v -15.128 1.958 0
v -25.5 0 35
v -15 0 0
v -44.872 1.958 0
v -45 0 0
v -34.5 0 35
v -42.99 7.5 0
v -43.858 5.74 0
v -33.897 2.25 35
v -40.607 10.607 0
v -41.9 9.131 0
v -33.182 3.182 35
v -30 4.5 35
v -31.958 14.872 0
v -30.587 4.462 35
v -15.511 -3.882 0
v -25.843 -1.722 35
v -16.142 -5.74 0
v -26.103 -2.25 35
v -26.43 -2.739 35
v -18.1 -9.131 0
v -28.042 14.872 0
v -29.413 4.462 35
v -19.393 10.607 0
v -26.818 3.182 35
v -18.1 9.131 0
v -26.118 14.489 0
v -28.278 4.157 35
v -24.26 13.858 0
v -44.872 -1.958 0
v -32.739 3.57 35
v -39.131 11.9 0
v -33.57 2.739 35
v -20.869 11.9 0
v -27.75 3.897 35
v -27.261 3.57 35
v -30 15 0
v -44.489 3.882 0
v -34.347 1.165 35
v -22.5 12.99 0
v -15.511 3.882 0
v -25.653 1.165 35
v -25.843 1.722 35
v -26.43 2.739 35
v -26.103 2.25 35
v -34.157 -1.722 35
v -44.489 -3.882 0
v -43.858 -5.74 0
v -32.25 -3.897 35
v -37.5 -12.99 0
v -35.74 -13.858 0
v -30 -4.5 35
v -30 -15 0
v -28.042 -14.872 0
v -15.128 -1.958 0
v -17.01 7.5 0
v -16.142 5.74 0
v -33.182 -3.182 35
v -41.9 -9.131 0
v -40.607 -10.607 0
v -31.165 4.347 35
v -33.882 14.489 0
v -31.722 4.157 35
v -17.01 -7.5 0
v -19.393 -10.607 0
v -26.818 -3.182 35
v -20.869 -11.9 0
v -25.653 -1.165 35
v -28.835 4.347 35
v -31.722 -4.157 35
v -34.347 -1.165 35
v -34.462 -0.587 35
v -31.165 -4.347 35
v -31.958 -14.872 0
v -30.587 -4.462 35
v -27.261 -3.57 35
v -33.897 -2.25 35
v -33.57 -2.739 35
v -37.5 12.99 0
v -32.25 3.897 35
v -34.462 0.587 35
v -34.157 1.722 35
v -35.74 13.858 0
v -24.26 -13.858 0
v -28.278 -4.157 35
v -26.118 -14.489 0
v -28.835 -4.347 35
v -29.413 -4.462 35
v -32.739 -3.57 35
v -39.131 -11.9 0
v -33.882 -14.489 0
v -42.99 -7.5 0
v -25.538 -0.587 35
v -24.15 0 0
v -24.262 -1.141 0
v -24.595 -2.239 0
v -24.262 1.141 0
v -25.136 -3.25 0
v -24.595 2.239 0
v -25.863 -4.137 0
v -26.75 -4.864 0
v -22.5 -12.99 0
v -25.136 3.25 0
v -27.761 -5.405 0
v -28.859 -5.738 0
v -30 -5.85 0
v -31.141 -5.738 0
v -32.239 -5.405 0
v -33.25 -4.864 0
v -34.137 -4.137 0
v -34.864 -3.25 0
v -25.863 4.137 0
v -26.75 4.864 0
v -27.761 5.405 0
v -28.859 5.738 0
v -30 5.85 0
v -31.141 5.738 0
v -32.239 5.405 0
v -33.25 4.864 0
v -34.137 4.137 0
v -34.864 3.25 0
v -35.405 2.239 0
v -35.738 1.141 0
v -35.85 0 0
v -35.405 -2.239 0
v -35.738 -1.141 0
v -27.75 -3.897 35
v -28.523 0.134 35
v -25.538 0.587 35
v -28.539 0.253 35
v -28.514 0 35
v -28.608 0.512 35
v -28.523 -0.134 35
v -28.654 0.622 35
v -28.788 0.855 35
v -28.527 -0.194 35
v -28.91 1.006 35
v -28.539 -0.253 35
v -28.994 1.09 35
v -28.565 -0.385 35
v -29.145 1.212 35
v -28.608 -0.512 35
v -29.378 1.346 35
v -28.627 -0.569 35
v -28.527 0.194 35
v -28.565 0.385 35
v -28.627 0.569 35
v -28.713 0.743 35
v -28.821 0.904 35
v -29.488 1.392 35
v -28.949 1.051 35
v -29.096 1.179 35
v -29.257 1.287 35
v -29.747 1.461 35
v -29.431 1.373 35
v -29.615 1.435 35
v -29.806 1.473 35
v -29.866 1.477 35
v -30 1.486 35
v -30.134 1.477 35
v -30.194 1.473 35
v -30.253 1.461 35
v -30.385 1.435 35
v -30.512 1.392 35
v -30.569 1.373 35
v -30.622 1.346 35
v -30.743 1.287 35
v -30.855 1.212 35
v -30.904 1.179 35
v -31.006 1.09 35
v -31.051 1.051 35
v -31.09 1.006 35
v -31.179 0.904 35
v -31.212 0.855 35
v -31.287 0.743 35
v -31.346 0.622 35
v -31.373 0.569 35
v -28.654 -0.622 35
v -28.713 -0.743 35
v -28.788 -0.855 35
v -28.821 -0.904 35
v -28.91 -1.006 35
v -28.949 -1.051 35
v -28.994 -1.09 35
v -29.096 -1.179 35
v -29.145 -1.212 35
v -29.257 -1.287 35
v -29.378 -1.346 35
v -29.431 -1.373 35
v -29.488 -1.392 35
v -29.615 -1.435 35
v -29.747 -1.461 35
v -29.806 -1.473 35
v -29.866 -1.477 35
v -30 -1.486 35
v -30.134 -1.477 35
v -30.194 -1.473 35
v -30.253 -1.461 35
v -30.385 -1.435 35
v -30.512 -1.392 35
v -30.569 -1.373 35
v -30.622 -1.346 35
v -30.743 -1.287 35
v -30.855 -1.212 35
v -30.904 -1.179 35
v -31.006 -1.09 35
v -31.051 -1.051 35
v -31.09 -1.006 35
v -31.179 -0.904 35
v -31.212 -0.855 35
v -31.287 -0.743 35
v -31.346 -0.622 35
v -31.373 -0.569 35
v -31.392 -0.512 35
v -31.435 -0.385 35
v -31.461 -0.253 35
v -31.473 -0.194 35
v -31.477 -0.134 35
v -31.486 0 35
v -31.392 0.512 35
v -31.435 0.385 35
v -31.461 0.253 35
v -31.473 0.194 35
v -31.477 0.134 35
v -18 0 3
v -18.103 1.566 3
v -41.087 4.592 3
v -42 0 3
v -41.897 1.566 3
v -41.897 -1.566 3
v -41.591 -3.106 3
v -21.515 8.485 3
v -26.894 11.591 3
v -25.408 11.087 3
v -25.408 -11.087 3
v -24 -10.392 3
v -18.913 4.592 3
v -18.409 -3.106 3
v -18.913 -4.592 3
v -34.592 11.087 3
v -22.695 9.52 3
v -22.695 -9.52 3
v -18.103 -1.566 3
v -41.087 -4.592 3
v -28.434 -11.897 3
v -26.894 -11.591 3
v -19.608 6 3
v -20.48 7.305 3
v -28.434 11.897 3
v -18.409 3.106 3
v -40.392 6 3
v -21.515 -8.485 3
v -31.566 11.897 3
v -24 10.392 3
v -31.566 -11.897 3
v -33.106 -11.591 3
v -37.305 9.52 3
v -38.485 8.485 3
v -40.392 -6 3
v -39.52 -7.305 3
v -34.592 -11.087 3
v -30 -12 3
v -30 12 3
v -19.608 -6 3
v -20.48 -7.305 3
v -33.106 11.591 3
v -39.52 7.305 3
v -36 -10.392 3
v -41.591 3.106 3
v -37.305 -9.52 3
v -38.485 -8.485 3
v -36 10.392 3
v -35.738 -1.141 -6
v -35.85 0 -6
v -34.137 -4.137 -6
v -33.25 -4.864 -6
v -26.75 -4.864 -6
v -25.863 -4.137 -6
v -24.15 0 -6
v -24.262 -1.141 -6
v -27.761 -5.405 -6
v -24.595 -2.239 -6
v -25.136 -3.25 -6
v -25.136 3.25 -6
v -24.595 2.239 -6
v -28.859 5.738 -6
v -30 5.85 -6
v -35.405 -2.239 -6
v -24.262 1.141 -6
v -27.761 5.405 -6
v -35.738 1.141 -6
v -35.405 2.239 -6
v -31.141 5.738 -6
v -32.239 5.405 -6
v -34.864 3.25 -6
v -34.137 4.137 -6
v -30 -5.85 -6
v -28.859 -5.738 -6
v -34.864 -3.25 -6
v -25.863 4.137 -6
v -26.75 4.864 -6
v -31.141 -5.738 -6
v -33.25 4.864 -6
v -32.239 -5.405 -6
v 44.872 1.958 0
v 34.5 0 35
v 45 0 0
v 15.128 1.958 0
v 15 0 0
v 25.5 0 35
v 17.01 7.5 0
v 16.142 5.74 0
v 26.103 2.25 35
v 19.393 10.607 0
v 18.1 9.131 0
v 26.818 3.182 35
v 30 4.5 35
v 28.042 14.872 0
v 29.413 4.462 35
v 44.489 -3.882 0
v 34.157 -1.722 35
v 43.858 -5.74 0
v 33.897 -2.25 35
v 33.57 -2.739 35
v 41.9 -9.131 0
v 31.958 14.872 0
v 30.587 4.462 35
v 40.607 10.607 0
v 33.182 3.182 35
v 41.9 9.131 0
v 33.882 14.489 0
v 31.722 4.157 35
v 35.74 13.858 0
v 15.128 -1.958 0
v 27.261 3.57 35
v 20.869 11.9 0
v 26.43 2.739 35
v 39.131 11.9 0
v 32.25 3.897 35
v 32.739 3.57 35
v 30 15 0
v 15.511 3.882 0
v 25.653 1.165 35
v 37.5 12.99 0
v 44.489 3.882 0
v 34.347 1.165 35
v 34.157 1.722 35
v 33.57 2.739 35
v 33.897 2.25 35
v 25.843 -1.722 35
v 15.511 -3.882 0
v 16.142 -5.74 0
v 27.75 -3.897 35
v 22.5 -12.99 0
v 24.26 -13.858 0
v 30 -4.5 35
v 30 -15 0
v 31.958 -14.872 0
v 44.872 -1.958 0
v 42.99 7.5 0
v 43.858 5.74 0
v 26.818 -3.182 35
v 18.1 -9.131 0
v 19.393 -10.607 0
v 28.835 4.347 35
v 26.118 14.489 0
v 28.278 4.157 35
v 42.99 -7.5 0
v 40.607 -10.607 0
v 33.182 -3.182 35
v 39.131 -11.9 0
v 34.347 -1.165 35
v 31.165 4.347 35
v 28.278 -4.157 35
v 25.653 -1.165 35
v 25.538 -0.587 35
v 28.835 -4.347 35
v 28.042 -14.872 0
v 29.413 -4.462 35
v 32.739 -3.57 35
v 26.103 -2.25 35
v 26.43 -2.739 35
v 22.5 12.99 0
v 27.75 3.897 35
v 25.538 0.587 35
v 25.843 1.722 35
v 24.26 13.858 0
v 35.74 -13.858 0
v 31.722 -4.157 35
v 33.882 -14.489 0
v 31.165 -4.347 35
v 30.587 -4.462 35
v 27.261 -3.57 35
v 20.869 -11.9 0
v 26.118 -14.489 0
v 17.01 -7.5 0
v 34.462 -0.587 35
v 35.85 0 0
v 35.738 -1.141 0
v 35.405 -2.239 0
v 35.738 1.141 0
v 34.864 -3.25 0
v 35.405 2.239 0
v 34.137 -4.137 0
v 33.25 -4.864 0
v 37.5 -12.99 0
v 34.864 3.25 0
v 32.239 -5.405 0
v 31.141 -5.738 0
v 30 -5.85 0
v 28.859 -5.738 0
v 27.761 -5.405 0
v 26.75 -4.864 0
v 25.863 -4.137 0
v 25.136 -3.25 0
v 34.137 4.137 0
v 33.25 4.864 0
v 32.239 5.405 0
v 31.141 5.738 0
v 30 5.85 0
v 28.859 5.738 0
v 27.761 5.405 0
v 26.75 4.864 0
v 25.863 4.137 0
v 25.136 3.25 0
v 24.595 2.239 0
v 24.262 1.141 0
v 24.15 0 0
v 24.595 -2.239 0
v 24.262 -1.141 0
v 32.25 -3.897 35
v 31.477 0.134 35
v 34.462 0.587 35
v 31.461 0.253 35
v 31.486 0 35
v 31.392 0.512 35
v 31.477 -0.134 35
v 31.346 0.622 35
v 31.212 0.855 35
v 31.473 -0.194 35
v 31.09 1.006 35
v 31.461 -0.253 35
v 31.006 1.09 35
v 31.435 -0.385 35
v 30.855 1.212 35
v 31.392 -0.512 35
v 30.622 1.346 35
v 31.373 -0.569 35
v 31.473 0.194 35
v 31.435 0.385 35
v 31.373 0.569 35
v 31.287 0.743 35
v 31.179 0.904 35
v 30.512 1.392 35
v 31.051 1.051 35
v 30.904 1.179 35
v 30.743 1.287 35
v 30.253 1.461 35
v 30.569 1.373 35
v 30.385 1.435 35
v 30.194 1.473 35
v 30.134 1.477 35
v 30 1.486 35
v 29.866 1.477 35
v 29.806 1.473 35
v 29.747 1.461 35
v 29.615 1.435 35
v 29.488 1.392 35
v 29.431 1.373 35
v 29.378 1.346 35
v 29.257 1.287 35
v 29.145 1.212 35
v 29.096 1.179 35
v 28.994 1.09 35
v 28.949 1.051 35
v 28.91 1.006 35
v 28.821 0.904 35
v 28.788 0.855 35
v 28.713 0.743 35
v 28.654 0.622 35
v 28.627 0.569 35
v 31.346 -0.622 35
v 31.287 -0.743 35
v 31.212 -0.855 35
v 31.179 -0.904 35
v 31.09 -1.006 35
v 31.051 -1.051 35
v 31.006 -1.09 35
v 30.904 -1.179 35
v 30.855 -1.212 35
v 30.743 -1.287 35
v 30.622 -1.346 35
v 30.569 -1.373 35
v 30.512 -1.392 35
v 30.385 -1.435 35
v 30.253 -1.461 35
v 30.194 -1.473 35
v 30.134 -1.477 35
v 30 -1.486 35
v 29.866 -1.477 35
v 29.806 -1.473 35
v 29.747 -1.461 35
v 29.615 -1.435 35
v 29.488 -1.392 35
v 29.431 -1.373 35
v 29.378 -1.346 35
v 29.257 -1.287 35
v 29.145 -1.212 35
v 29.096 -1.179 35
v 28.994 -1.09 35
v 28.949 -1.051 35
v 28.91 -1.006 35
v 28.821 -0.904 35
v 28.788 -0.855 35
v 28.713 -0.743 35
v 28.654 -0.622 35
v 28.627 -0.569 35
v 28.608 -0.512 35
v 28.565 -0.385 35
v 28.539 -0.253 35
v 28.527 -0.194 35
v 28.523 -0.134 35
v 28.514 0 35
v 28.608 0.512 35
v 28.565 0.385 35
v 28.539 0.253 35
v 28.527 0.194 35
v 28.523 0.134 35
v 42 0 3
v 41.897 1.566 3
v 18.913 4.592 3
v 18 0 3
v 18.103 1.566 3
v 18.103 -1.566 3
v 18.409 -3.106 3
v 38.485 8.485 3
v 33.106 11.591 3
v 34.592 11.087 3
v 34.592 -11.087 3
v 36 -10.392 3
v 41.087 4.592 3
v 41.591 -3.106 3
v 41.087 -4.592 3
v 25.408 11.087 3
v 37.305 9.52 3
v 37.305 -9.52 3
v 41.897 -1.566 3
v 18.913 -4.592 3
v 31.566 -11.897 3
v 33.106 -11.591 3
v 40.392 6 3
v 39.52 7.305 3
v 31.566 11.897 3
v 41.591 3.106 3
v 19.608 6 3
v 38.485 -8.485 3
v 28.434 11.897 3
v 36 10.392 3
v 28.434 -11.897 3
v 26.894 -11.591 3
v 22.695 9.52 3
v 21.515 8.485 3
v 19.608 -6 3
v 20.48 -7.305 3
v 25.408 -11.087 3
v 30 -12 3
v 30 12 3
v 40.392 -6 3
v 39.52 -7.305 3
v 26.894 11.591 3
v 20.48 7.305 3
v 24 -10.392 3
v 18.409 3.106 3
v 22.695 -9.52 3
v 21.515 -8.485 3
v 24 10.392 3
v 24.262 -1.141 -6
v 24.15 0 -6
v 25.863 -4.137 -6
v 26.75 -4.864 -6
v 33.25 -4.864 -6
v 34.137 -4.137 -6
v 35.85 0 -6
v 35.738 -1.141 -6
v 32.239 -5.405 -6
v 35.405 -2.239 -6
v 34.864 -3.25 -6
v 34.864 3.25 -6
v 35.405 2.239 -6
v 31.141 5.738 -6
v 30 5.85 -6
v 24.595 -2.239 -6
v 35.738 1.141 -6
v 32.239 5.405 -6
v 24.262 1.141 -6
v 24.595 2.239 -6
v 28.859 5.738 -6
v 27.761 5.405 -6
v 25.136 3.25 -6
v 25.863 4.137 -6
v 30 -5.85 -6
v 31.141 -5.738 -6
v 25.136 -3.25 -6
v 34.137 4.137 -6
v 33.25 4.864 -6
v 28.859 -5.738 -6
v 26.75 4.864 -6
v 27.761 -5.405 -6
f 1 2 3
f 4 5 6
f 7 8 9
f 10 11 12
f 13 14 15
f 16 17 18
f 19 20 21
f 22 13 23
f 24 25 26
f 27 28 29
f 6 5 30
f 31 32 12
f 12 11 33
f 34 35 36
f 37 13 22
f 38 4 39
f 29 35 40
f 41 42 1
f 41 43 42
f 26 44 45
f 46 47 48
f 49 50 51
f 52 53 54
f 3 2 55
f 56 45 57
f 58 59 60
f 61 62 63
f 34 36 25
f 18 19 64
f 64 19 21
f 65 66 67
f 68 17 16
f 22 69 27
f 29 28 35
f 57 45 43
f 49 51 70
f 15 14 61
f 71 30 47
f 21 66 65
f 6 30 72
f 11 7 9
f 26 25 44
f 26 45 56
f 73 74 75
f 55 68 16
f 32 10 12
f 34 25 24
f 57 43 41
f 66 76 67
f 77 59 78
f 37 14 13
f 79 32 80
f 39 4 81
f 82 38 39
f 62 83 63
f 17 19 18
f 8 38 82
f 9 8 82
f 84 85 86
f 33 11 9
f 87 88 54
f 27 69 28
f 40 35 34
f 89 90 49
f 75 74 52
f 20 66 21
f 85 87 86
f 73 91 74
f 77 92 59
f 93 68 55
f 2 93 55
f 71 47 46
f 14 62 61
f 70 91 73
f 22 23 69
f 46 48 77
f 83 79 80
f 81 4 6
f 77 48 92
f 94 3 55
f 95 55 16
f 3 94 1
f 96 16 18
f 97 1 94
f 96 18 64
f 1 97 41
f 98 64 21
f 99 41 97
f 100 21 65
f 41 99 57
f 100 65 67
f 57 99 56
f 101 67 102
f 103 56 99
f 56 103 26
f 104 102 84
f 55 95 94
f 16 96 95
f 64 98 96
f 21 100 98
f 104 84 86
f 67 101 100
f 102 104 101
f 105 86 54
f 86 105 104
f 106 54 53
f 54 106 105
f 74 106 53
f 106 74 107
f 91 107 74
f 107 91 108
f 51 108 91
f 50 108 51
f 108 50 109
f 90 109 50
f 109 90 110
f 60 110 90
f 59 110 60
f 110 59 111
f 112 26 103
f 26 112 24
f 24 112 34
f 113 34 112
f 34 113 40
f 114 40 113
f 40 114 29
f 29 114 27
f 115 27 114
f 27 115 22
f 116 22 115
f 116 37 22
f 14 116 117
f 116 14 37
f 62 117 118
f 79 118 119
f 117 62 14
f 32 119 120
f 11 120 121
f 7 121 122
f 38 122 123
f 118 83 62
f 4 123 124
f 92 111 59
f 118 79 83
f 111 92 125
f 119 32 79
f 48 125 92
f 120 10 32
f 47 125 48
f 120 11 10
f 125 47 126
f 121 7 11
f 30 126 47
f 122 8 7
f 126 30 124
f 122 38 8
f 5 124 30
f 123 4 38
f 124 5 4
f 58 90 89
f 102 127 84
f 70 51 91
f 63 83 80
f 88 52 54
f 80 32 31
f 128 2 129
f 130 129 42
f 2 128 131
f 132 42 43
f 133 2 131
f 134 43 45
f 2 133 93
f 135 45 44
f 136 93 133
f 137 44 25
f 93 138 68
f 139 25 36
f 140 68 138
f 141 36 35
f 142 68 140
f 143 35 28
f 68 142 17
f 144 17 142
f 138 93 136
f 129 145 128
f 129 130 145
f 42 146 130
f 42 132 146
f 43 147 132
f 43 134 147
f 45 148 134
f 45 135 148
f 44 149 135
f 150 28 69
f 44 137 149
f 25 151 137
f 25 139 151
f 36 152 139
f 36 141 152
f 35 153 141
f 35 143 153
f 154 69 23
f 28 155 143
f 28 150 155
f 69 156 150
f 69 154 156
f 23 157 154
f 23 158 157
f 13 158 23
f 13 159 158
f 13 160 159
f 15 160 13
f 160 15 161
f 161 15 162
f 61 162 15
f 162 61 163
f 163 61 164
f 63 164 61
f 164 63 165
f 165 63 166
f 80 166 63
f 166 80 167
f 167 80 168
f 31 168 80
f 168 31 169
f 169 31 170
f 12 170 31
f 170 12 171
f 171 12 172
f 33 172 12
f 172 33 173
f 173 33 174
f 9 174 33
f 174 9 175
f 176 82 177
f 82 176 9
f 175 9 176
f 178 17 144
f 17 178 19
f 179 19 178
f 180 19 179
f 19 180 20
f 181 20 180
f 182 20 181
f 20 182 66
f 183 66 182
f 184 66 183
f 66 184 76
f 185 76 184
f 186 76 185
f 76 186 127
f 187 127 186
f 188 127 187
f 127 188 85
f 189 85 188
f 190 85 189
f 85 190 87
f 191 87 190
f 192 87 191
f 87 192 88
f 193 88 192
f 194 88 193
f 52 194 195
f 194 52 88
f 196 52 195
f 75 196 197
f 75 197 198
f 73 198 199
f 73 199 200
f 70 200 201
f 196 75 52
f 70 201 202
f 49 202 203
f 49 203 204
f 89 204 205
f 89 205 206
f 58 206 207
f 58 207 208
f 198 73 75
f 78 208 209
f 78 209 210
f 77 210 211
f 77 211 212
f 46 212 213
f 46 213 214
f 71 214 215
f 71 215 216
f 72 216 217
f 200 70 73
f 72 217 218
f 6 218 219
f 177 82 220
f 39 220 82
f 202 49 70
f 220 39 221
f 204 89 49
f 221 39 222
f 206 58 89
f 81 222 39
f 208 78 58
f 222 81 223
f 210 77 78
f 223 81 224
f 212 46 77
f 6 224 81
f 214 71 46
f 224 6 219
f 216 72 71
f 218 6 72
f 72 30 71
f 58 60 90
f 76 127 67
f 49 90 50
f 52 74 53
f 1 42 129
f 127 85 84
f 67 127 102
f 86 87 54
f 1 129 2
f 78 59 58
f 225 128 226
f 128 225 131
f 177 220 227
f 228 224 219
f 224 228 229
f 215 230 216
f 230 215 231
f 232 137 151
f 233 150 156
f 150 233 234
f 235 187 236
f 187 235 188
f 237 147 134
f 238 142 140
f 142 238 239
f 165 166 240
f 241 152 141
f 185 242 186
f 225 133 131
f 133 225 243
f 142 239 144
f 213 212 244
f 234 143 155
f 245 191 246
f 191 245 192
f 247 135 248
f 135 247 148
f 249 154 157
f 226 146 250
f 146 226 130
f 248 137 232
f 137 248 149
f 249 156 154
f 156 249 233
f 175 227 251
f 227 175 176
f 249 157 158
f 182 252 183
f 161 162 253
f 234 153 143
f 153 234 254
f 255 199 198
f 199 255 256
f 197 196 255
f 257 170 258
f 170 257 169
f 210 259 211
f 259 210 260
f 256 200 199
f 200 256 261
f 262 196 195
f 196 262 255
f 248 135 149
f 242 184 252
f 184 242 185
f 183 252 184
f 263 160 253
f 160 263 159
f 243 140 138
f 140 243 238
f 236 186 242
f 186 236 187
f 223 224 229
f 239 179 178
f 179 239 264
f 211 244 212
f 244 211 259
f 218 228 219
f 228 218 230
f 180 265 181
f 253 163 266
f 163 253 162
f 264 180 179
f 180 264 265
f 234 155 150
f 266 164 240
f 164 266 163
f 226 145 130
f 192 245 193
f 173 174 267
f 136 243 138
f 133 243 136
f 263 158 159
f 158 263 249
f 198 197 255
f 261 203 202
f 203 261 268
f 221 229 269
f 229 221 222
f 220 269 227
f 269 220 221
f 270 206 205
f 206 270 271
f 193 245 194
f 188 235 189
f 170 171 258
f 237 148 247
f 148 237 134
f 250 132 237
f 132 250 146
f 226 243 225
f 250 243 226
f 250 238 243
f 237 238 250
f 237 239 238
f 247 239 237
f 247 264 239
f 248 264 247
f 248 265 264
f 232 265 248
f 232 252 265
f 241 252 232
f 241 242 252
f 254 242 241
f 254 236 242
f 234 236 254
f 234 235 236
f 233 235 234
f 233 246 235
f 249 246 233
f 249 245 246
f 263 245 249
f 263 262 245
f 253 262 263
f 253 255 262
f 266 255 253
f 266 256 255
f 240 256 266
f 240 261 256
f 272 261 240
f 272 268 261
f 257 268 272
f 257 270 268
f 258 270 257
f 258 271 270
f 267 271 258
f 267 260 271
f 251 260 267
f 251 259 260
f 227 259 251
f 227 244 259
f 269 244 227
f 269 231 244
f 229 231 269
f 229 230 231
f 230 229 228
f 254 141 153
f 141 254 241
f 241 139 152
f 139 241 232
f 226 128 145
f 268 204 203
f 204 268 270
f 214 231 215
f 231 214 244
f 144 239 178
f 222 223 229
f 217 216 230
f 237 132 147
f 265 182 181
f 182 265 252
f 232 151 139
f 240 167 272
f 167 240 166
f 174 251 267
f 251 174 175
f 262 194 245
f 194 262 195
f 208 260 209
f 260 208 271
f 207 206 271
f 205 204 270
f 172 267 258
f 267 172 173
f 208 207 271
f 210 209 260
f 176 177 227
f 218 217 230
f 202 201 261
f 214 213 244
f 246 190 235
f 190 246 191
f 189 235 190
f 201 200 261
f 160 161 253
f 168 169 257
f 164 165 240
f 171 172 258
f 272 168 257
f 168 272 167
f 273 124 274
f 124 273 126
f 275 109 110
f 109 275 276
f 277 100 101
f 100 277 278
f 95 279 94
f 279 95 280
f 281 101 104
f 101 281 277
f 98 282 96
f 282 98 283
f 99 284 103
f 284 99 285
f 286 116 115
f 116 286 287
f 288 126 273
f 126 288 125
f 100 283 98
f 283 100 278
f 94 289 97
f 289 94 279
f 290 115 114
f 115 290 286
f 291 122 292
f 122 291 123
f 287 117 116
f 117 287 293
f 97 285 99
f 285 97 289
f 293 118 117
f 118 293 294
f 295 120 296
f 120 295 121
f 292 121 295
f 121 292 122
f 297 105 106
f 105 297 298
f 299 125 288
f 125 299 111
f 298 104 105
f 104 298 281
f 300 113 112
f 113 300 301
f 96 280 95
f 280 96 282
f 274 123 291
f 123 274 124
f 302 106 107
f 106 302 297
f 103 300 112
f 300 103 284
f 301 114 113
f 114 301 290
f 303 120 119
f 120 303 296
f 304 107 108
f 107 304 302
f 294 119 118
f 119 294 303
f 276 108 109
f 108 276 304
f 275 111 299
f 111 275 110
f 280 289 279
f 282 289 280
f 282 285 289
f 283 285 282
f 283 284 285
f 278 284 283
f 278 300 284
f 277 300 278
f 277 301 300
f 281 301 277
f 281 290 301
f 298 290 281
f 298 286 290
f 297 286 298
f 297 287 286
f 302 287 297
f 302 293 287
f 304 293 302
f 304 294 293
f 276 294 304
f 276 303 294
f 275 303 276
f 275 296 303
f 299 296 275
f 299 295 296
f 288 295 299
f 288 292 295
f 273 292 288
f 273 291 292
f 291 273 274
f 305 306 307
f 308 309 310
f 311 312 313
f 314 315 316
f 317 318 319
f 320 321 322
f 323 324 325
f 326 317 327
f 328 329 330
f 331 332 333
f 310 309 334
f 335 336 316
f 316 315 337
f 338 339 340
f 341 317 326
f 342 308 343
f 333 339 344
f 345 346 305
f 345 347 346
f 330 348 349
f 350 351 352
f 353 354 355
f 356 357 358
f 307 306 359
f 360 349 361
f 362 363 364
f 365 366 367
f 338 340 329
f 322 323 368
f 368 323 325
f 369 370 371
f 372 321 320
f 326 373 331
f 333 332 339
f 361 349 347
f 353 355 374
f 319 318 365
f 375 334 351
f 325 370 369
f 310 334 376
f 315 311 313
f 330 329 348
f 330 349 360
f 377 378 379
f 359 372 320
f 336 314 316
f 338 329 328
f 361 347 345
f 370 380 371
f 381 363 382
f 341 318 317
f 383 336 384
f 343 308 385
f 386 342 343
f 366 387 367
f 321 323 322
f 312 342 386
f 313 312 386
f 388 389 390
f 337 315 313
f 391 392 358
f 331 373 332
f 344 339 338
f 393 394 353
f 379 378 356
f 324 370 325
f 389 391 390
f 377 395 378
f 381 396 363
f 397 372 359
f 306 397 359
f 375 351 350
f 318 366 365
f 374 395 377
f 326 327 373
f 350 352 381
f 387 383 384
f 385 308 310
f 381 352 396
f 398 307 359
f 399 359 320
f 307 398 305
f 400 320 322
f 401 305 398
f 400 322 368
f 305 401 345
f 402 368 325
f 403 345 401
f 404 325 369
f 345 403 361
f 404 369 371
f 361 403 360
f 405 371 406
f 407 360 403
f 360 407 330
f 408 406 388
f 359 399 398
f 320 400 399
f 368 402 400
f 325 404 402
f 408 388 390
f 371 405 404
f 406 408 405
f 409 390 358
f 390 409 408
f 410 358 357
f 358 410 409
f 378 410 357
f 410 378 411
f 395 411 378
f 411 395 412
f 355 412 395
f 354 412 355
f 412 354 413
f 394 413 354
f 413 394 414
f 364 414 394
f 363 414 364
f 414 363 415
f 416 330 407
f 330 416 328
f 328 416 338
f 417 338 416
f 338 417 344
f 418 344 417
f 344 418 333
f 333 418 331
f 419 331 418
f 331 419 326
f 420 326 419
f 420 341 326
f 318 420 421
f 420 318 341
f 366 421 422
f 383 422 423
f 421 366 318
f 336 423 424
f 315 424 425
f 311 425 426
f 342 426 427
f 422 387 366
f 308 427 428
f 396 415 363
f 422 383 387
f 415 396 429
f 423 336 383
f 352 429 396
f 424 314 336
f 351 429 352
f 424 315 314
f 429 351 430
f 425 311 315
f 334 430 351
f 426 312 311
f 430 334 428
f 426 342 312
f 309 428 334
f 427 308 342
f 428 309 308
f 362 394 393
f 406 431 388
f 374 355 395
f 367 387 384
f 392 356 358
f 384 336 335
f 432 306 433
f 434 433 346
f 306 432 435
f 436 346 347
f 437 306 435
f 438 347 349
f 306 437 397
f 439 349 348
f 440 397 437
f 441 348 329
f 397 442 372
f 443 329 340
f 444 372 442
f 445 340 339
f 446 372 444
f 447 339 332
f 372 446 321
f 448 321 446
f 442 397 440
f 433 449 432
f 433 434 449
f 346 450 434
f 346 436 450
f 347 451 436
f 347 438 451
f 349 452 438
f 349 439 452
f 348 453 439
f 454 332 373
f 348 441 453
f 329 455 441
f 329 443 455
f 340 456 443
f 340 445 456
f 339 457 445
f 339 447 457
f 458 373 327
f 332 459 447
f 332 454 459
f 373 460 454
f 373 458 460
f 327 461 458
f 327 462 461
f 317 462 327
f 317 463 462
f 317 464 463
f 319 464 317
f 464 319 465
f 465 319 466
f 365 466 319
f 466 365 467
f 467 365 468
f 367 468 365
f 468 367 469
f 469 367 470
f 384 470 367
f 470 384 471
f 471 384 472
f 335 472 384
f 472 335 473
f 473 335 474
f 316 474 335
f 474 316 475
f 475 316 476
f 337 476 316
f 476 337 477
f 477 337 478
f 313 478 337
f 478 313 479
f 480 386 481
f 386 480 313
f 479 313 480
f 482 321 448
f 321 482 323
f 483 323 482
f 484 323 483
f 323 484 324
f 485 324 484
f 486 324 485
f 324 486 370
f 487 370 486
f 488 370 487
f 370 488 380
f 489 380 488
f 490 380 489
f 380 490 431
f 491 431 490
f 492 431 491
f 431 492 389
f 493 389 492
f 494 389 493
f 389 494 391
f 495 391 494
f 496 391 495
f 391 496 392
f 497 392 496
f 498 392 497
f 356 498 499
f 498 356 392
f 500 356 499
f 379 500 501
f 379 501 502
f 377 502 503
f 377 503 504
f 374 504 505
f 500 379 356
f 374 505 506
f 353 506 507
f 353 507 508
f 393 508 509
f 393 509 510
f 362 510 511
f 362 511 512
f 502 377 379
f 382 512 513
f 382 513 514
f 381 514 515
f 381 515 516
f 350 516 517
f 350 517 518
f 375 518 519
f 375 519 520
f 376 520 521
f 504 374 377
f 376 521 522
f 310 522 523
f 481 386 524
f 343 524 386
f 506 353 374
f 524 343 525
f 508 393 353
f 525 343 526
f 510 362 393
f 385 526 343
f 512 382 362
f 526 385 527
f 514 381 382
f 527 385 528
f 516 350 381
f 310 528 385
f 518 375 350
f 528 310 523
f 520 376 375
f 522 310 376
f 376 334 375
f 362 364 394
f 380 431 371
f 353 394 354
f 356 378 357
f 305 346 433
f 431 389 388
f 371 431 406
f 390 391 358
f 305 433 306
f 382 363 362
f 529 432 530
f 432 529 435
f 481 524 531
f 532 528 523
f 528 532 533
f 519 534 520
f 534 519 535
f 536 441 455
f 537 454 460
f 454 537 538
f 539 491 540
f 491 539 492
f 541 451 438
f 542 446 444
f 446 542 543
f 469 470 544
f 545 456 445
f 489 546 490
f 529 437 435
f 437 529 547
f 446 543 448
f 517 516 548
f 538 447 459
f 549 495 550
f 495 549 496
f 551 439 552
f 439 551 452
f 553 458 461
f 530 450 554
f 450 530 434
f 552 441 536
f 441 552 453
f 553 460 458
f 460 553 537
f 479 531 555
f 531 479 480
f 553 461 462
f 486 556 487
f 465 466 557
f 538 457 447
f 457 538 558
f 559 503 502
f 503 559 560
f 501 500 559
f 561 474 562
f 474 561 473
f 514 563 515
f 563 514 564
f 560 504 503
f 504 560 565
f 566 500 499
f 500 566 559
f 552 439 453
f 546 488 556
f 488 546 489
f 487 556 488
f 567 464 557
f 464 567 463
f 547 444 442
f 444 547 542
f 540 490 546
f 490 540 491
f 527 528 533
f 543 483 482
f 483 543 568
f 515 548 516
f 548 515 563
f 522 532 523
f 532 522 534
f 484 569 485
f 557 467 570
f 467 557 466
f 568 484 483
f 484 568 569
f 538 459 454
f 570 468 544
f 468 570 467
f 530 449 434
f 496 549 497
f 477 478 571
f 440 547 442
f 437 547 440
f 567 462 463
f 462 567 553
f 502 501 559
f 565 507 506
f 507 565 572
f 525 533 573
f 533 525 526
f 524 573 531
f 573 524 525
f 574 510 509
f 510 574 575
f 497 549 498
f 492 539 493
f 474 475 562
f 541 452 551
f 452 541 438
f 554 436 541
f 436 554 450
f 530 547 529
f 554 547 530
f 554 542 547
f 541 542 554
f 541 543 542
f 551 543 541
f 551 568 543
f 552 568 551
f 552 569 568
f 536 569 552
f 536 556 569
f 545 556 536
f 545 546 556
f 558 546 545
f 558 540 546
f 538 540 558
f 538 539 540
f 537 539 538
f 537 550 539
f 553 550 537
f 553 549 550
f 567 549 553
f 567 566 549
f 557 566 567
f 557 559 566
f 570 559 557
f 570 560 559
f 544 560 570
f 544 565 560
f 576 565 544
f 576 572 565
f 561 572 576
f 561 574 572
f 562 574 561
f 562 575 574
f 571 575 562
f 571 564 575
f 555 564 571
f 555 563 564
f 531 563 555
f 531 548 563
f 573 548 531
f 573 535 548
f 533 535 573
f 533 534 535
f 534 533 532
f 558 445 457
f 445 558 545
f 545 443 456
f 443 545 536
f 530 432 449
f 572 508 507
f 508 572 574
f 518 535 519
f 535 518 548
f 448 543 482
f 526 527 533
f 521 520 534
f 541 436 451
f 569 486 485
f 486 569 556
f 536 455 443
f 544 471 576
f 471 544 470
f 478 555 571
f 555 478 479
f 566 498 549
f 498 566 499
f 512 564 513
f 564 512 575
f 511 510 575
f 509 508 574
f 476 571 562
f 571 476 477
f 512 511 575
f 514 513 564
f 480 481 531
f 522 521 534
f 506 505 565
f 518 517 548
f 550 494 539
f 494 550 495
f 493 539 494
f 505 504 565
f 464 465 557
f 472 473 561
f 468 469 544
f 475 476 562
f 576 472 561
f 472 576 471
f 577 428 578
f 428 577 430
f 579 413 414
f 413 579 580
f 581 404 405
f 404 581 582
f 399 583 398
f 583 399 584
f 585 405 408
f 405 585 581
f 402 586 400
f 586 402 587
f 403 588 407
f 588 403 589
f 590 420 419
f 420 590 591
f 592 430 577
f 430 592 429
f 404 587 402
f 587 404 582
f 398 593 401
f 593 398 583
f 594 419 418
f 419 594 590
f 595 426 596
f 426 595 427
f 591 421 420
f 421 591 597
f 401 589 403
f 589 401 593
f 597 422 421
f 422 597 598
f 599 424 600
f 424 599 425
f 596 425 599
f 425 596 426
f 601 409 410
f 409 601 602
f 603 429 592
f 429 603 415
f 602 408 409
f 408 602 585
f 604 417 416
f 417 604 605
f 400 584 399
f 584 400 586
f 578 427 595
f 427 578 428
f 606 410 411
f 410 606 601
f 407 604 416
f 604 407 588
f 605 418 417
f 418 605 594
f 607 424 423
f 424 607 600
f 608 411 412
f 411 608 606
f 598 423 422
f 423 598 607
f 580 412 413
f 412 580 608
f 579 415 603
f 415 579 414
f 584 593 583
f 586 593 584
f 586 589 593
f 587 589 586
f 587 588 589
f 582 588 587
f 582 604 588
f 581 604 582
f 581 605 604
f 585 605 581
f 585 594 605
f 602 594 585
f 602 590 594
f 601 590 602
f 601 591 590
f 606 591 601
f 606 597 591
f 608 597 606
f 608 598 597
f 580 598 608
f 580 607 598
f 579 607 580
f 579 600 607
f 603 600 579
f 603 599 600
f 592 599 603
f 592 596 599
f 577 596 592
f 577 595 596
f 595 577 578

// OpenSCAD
// file: params.scad
// =========================================================
// Robot Layla — Paramètres communs à toutes les pièces
// Modifiez ces valeurs selon vos composants réels avant
// d'exporter les STL (mesurez vos moteurs/écran au pied à
// coulisse si possible, les kits varient légèrement).
// =========================================================

// --- Général ---
wall = 3;              // épaisseur de paroi standard (mm)
tolerance = 0.3;       // jeu pour les pièces qui s'emboîtent (mm)

// --- Châssis / base ---
base_length = 120;     // longueur de la base (mm)
base_width  = 100;     // largeur de la base (mm)
base_height = 25;      // hauteur des parois de la base (mm)
corner_radius = 15;    // rayon des coins arrondis de la base

// --- Moteurs (kit "TT motor gearbox" standard) ---
motor_length = 70;     // longueur du moteur + boîte de vitesse (mm)
motor_width  = 22;     // largeur du moteur (mm)
motor_height = 18;     // hauteur du moteur (mm)
motor_shaft_offset = 9; // hauteur de l'axe par rapport au bas du moteur (mm)

// --- Roulette folle ---
caster_diameter = 25;  // diamètre de la roulette (mm)
caster_mount_hole = 3; // diamètre des trous de fixation (mm)

// --- Tête / écran OLED ---
head_diameter = 90;    // diamètre de la tête (mm)
head_height   = 60;    // hauteur de la tête (mm)
oled_width  = 27.3;    // largeur de la carte OLED SSD1306 0.96" (mm)
oled_height = 27.8;    // hauteur de la carte OLED (mm)
oled_screen_width  = 21.7; // zone d'affichage utile (mm)
oled_screen_height = 11.2;
oled_thickness = 4;    // épaisseur approx de la carte + connecteurs (mm)

// --- Capteur ultrason (le "nez") ---
us_width  = 45;        // largeur du HC-SR04 (mm)
us_height = 20;         // hauteur du HC-SR04 (mm)
us_eye_diameter = 16;   // diamètre des "yeux" du capteur (les 2 cylindres)
us_eye_spacing = 26;    // entraxe entre les 2 cylindres du capteur

// --- Oreilles ---
ear_base_diameter = 30; // diamètre à la base de l'oreille (mm)
ear_height = 35;        // hauteur de l'oreille (mm)
ear_spacing = 60;       // écart entre les 2 oreilles (mm)

// --- Vis M3 ---
m3_diameter = 3.2;      // diamètre de perçage pour vis M3 (passage libre)
m3_head_diameter = 6.5; // diamètre de la tête de vis M3 (pour fraisage)
// main file
// =========================================================
// Robot Layla — Oreilles amovibles
// Imprimées séparément pour pouvoir les personnaliser
// facilement (couleur différente, forme, etc.) avec votre fille.
// =========================================================
include <params.scad>

module ear() {
    difference() {
        union() {
            cylinder(h = ear_height, d1 = ear_base_diameter, d2 = ear_base_diameter*0.3, $fn = 48);
        }
        // on évide pour alléger et économiser du filament
        translate([0, 0, wall])
            cylinder(h = ear_height, d1 = ear_base_diameter - wall*2, d2 = 1, $fn = 48);
    }
    // tenon de fixation (s'enfiche dans un trou de la tête)
    translate([0, 0, -6])
        cylinder(h = 6, d = ear_base_diameter*0.4 - tolerance, $fn = 32);
}

// Deux oreilles, espacées pour l'impression
translate([-ear_spacing/2, 0, 0]) ear();
translate([ear_spacing/2, 0, 0]) ear();

// NOTE: imprimez "à plat" comme ci-dessus (base vers le bas),
// pas de support nécessaire. Changez de filament entre les deux
// oreilles si vous voulez 2 couleurs différentes !
